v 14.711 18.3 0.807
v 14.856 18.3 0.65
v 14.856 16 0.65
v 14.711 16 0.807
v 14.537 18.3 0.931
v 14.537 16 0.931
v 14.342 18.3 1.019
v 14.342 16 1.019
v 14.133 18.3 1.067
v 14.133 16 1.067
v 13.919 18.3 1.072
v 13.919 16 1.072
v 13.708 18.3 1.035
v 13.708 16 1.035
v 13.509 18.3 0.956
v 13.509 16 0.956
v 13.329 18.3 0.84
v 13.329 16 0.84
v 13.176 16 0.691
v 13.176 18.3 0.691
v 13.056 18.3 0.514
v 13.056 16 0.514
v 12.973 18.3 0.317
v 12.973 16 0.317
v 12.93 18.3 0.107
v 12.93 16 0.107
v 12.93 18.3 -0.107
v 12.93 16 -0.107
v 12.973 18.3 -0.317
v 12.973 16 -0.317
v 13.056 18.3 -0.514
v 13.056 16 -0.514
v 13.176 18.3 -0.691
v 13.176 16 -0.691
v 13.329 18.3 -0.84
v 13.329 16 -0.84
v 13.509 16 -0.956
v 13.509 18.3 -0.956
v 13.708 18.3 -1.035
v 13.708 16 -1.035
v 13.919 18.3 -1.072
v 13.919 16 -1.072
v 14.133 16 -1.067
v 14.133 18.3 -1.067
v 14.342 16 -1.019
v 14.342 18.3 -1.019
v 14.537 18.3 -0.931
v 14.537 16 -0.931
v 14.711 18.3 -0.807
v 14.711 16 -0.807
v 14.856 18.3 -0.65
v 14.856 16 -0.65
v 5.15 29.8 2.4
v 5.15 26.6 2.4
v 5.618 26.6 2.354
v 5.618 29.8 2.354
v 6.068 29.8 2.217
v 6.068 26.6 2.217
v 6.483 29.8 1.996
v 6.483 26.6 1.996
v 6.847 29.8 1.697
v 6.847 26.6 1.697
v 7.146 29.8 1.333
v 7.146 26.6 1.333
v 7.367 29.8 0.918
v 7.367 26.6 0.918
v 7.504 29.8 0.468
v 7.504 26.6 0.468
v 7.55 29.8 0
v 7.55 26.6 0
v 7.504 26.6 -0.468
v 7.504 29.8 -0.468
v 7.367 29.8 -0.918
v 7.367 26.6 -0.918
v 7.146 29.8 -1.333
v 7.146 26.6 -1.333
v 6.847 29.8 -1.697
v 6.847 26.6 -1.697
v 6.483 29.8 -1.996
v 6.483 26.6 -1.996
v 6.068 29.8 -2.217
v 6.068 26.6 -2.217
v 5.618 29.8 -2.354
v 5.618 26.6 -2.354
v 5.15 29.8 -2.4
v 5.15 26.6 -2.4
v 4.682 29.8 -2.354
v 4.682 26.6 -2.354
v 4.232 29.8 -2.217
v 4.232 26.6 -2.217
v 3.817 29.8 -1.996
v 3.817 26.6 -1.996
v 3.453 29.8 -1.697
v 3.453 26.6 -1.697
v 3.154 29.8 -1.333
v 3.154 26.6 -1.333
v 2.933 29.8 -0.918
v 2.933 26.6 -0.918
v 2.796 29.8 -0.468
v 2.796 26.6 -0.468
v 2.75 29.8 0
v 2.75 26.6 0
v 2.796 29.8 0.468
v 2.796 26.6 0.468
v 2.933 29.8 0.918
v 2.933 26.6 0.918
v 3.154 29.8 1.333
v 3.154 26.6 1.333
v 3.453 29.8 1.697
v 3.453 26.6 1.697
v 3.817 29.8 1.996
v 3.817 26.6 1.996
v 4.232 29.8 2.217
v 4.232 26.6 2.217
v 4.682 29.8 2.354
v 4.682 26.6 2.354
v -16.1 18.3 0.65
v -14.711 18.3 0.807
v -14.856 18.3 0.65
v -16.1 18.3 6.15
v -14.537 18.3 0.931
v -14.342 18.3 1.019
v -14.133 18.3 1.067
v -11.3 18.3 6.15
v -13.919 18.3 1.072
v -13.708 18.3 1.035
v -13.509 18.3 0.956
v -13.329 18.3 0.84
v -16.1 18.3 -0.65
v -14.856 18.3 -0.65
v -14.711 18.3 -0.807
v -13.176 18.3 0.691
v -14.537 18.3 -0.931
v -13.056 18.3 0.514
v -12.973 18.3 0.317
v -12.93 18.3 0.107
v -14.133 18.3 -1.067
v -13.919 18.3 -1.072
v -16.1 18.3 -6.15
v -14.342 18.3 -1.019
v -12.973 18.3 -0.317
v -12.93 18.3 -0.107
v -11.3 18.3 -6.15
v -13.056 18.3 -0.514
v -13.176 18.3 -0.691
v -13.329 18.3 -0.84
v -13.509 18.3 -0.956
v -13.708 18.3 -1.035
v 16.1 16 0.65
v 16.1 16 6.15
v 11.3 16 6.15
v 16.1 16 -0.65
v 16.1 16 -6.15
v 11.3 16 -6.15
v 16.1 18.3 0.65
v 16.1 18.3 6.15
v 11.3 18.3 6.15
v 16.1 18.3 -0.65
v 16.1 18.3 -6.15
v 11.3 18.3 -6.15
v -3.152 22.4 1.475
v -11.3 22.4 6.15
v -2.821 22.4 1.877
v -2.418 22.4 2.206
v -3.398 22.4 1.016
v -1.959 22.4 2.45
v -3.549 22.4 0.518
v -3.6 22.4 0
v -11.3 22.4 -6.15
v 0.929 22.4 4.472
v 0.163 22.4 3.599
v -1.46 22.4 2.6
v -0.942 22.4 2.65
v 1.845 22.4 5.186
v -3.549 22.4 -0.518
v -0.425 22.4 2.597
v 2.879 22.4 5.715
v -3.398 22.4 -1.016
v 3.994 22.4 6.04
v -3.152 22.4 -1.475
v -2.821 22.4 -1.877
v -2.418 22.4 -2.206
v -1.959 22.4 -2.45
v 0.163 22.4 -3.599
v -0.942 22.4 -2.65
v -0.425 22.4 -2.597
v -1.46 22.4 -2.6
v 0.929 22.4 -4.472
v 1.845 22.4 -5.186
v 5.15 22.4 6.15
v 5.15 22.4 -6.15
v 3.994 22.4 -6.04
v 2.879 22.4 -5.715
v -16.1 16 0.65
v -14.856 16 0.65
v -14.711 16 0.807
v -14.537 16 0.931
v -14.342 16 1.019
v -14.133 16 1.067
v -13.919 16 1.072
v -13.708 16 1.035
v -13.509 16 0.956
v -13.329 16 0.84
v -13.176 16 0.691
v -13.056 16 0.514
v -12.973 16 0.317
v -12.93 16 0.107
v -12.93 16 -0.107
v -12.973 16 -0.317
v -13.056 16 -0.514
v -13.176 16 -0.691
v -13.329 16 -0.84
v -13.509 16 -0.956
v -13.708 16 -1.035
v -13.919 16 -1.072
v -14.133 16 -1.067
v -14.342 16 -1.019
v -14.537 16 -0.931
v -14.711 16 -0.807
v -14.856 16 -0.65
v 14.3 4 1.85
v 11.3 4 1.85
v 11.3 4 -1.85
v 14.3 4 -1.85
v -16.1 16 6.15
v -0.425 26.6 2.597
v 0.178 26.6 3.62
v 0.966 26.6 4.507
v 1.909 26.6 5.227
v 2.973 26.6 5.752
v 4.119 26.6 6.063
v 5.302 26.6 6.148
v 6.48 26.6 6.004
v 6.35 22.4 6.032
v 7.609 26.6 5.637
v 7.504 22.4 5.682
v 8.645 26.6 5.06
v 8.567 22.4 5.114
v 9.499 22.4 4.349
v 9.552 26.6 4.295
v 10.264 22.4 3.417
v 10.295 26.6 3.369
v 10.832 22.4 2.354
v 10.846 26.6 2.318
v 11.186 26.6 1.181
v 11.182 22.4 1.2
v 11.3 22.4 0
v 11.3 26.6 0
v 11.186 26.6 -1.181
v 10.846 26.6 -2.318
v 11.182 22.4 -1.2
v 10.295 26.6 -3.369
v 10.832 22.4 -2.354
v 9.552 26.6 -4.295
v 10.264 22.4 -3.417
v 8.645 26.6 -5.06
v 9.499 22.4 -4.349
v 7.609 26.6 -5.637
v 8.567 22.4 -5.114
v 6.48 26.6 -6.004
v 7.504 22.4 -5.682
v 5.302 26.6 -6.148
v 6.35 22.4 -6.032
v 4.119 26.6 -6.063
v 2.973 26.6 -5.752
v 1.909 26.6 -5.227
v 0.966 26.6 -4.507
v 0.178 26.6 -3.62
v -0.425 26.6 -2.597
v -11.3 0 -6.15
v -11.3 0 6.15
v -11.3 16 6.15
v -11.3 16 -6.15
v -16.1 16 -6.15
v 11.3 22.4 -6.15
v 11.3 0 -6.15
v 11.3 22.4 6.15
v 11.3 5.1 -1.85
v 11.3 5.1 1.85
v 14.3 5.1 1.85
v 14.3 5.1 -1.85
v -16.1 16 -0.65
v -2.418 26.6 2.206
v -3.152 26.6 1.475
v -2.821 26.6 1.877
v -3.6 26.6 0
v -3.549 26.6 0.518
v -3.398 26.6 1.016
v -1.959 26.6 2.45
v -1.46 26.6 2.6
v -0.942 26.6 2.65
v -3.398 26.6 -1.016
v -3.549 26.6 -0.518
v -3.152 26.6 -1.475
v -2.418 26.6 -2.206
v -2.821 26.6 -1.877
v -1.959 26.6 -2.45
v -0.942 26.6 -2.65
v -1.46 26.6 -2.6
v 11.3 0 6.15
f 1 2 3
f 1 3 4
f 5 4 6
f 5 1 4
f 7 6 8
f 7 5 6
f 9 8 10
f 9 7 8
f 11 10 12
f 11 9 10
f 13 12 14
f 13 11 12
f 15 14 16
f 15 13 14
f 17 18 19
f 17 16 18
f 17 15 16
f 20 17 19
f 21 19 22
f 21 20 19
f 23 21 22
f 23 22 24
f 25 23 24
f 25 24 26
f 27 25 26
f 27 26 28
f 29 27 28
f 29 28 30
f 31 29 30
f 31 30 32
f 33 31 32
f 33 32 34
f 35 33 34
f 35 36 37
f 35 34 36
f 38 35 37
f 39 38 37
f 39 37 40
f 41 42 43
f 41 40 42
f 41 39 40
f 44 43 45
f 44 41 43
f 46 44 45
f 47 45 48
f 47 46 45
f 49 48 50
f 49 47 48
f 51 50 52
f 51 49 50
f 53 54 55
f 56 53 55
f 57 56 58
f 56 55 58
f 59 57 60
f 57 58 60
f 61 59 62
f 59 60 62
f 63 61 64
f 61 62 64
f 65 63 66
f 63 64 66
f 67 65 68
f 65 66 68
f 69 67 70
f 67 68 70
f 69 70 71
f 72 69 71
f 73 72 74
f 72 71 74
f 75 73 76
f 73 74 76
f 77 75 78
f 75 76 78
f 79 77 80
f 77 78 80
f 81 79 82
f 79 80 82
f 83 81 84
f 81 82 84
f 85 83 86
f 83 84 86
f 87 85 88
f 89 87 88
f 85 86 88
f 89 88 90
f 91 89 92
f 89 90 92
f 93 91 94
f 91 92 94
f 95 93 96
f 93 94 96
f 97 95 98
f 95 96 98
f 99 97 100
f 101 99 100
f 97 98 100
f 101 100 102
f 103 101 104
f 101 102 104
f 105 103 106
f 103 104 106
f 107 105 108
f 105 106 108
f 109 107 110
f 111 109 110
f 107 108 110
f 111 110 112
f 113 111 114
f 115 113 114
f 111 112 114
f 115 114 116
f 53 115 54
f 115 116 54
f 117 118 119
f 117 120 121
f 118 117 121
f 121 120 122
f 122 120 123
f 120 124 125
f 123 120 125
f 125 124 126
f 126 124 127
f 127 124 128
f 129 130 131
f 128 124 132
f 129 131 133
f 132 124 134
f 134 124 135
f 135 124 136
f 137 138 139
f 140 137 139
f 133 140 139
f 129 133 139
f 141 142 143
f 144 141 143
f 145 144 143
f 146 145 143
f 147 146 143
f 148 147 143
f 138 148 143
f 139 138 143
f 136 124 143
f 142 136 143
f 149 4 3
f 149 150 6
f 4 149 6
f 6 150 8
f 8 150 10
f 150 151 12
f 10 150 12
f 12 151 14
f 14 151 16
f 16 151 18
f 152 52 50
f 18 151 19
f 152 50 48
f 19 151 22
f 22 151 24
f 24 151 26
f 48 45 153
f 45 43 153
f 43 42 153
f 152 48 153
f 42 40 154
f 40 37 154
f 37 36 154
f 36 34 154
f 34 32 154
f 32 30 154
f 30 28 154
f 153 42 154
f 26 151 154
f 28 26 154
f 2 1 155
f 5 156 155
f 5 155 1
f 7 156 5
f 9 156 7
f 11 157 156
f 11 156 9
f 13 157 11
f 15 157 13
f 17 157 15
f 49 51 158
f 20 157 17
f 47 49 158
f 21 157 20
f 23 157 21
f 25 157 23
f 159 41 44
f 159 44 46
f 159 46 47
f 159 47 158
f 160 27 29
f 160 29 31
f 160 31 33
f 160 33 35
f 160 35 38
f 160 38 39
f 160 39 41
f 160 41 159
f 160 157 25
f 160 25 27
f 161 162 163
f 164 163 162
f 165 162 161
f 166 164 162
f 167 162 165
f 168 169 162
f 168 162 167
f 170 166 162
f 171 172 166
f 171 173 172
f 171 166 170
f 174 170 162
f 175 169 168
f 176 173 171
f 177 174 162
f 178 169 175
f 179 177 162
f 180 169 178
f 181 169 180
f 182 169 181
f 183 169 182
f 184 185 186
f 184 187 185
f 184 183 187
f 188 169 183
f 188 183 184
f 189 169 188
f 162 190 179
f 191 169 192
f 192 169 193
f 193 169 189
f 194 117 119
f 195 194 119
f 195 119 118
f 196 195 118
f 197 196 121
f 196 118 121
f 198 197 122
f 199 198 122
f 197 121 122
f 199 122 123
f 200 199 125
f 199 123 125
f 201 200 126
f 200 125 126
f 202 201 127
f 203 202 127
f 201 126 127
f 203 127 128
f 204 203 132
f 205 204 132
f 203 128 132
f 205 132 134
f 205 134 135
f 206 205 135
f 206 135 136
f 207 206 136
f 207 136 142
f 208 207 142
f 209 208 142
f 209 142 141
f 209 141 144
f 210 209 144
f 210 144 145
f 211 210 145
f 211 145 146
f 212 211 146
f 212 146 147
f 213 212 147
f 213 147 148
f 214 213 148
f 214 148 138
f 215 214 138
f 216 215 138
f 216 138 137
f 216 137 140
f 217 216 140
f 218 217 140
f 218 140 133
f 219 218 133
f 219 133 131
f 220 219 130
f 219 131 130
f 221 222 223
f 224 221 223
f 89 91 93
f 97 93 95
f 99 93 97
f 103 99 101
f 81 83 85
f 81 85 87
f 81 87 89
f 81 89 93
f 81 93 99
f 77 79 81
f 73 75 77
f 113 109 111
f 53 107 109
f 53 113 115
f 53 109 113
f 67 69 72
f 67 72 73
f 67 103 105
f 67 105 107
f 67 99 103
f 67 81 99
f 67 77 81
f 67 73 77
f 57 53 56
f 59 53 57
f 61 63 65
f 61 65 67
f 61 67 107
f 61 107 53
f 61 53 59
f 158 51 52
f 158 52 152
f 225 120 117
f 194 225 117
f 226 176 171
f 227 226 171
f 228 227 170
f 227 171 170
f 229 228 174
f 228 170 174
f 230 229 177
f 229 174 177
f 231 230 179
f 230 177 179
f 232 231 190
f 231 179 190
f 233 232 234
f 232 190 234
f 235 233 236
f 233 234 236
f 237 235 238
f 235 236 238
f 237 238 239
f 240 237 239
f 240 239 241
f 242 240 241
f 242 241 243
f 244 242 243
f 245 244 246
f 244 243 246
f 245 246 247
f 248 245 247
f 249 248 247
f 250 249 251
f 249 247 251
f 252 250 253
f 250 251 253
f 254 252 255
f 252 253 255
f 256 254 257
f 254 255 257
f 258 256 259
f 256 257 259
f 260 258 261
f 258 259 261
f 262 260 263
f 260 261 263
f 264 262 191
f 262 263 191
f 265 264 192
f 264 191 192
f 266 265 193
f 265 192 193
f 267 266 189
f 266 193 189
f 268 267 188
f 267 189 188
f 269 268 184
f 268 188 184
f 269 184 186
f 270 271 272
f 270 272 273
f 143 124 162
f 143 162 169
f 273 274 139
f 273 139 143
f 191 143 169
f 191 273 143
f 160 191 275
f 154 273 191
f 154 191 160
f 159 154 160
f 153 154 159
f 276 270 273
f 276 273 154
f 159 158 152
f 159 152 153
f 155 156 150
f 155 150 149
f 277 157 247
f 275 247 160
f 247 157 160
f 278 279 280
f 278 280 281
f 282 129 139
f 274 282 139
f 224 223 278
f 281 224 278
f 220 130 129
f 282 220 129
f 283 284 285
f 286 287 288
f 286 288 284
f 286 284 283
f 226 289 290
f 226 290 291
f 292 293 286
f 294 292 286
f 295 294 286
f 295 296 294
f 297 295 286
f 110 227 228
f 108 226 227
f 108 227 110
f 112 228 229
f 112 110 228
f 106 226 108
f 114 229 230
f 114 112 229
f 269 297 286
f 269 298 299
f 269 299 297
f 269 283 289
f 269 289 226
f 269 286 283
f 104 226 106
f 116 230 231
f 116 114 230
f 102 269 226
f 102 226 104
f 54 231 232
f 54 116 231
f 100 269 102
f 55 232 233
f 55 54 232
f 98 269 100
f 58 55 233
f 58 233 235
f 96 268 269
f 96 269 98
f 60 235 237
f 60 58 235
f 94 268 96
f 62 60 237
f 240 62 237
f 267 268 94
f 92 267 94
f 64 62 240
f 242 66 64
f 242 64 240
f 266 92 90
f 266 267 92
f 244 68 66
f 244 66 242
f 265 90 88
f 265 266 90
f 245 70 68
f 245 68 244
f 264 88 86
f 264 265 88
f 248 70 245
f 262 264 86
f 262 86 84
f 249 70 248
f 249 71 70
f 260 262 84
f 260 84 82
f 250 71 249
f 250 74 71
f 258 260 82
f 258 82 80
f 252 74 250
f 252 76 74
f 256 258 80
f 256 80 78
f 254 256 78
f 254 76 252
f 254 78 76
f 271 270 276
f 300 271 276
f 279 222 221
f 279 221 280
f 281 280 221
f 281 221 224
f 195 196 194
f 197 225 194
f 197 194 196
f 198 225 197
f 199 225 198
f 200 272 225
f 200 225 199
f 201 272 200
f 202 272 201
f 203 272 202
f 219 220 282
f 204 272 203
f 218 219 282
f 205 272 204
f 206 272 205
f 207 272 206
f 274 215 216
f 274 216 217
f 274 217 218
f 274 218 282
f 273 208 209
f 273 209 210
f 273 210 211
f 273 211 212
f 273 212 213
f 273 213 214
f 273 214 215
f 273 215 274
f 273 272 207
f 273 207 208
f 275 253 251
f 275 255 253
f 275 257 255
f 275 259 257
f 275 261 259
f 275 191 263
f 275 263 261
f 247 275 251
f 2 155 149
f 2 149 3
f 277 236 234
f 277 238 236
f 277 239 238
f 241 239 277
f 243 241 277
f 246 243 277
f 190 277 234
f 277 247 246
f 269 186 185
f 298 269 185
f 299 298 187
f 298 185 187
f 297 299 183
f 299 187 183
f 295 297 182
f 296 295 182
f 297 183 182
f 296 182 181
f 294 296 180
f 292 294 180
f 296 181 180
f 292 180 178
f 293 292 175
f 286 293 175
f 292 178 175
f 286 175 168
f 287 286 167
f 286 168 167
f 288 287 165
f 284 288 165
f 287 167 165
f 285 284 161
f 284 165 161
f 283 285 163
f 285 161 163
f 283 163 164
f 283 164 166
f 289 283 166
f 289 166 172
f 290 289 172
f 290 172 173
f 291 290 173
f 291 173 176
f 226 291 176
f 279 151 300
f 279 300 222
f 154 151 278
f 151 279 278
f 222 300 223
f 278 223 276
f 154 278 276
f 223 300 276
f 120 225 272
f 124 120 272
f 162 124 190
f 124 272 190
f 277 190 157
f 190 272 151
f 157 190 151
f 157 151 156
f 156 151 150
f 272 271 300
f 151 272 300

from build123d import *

# Parameters (mm, degrees)
ESBO_O1_W                = 22.6
ESBO_O1_H                = 12.3
RESSALTO_EXTRUS_O1_DEPTH = 22.4
ESBO_O2_W                = 12.3
ESBO_O2_H                = 2.3
RESSALTO_EXTRUS_O2_DEPTH = 4.8
CORTE_EXTRUS_O1_DEPTH    = 26.13806874
RESSALTO_EXTRUS_O3_DEPTH = 4.2
ESBO_O5_R                = 2.4
RESSALTO_EXTRUS_O4_DEPTH = 3.2
ESBO_O6_W                = 3.7
ESBO_O6_H                = 1.1
RESSALTO_EXTRUS_O5_DEPTH = 3


with BuildPart() as part:
    # Esboço1 → Ressalto-extrusão1 (new body)
    with BuildSketch(Plane(origin=(0, 0, 0), x_dir=(1, 0, 0), z_dir=(0, 1, 0))):
        Rectangle(ESBO_O1_W, ESBO_O1_H)
    extrude(amount=RESSALTO_EXTRUS_O1_DEPTH)

    # Esboço2 → Ressalto-extrusão2 (add)
    with BuildSketch(Plane(origin=(11.3, 0, 0), x_dir=(0, 0, -1), z_dir=(1, 0, 0))):
        with Locations((0, 17.15)):
            Rectangle(ESBO_O2_W, ESBO_O2_H)
    ressalto_extrus_o2 = extrude(amount=RESSALTO_EXTRUS_O2_DEPTH)

    # Esboço3 → Corte-extrusão1 (cut, through all)
    with BuildSketch(Plane(origin=(0, 18.3, 0), x_dir=(1, 0, 0), z_dir=(0, 1, 0))):
        with BuildLine():
            Line((14.856227189, 0.65), (16.1, 0.65))
            Line((16.1, 0.65), (16.1, -0.65))
            Line((16.1, -0.65), (14.856227189, -0.65))
            ThreePointArc((14.856227189, -0.65), (12.925, 0), (14.856227189, 0.65))
        make_face()
    corte_extrus_o1 = extrude(amount=-CORTE_EXTRUS_O1_DEPTH, mode=Mode.SUBTRACT)

    # Espelhar1: Ressalto-extrusão2, Corte-extrusão1 across plane
    add(ressalto_extrus_o2.mirror(Plane(origin=(0, 0, 0), x_dir=(0, 0, 1), z_dir=(1, 0, 0))))
    add(corte_extrus_o1.mirror(Plane(origin=(0, 0, 0), x_dir=(0, 0, 1), z_dir=(1, 0, 0))), mode=Mode.SUBTRACT)

    # Esboço4 → Ressalto-extrusão3 (add)
    with BuildSketch(Plane(origin=(0, 22.4, 0), x_dir=(1, 0, 0), z_dir=(0, 1, 0))):
        with BuildLine():
            ThreePointArc((-0.424590164, -2.597391866), (11.3, 0), (-0.424590164, 2.597391866))
            ThreePointArc((-0.424590164, 2.597391866), (-3.6, 0), (-0.424590164, -2.597391866))
        make_face()
    extrude(amount=RESSALTO_EXTRUS_O3_DEPTH)

    # Esboço5 → Ressalto-extrusão4 (add)
    with BuildSketch(Plane(origin=(0, 26.6, 0), x_dir=(1, 0, 0), z_dir=(0, 1, 0))):
        with Locations(Location((5.15, 0, 0), (0, 0, 270))):
            Circle(ESBO_O5_R)
    extrude(amount=RESSALTO_EXTRUS_O4_DEPTH)

    # Esboço6 → Ressalto-extrusão5 (add)
    with BuildSketch(Plane(origin=(11.3, 0, 0), x_dir=(0, 0, -1), z_dir=(1, 0, 0))):
        with Locations((0, 4.55)):
            Rectangle(ESBO_O6_W, ESBO_O6_H)
    extrude(amount=RESSALTO_EXTRUS_O5_DEPTH)


solid = part.part
